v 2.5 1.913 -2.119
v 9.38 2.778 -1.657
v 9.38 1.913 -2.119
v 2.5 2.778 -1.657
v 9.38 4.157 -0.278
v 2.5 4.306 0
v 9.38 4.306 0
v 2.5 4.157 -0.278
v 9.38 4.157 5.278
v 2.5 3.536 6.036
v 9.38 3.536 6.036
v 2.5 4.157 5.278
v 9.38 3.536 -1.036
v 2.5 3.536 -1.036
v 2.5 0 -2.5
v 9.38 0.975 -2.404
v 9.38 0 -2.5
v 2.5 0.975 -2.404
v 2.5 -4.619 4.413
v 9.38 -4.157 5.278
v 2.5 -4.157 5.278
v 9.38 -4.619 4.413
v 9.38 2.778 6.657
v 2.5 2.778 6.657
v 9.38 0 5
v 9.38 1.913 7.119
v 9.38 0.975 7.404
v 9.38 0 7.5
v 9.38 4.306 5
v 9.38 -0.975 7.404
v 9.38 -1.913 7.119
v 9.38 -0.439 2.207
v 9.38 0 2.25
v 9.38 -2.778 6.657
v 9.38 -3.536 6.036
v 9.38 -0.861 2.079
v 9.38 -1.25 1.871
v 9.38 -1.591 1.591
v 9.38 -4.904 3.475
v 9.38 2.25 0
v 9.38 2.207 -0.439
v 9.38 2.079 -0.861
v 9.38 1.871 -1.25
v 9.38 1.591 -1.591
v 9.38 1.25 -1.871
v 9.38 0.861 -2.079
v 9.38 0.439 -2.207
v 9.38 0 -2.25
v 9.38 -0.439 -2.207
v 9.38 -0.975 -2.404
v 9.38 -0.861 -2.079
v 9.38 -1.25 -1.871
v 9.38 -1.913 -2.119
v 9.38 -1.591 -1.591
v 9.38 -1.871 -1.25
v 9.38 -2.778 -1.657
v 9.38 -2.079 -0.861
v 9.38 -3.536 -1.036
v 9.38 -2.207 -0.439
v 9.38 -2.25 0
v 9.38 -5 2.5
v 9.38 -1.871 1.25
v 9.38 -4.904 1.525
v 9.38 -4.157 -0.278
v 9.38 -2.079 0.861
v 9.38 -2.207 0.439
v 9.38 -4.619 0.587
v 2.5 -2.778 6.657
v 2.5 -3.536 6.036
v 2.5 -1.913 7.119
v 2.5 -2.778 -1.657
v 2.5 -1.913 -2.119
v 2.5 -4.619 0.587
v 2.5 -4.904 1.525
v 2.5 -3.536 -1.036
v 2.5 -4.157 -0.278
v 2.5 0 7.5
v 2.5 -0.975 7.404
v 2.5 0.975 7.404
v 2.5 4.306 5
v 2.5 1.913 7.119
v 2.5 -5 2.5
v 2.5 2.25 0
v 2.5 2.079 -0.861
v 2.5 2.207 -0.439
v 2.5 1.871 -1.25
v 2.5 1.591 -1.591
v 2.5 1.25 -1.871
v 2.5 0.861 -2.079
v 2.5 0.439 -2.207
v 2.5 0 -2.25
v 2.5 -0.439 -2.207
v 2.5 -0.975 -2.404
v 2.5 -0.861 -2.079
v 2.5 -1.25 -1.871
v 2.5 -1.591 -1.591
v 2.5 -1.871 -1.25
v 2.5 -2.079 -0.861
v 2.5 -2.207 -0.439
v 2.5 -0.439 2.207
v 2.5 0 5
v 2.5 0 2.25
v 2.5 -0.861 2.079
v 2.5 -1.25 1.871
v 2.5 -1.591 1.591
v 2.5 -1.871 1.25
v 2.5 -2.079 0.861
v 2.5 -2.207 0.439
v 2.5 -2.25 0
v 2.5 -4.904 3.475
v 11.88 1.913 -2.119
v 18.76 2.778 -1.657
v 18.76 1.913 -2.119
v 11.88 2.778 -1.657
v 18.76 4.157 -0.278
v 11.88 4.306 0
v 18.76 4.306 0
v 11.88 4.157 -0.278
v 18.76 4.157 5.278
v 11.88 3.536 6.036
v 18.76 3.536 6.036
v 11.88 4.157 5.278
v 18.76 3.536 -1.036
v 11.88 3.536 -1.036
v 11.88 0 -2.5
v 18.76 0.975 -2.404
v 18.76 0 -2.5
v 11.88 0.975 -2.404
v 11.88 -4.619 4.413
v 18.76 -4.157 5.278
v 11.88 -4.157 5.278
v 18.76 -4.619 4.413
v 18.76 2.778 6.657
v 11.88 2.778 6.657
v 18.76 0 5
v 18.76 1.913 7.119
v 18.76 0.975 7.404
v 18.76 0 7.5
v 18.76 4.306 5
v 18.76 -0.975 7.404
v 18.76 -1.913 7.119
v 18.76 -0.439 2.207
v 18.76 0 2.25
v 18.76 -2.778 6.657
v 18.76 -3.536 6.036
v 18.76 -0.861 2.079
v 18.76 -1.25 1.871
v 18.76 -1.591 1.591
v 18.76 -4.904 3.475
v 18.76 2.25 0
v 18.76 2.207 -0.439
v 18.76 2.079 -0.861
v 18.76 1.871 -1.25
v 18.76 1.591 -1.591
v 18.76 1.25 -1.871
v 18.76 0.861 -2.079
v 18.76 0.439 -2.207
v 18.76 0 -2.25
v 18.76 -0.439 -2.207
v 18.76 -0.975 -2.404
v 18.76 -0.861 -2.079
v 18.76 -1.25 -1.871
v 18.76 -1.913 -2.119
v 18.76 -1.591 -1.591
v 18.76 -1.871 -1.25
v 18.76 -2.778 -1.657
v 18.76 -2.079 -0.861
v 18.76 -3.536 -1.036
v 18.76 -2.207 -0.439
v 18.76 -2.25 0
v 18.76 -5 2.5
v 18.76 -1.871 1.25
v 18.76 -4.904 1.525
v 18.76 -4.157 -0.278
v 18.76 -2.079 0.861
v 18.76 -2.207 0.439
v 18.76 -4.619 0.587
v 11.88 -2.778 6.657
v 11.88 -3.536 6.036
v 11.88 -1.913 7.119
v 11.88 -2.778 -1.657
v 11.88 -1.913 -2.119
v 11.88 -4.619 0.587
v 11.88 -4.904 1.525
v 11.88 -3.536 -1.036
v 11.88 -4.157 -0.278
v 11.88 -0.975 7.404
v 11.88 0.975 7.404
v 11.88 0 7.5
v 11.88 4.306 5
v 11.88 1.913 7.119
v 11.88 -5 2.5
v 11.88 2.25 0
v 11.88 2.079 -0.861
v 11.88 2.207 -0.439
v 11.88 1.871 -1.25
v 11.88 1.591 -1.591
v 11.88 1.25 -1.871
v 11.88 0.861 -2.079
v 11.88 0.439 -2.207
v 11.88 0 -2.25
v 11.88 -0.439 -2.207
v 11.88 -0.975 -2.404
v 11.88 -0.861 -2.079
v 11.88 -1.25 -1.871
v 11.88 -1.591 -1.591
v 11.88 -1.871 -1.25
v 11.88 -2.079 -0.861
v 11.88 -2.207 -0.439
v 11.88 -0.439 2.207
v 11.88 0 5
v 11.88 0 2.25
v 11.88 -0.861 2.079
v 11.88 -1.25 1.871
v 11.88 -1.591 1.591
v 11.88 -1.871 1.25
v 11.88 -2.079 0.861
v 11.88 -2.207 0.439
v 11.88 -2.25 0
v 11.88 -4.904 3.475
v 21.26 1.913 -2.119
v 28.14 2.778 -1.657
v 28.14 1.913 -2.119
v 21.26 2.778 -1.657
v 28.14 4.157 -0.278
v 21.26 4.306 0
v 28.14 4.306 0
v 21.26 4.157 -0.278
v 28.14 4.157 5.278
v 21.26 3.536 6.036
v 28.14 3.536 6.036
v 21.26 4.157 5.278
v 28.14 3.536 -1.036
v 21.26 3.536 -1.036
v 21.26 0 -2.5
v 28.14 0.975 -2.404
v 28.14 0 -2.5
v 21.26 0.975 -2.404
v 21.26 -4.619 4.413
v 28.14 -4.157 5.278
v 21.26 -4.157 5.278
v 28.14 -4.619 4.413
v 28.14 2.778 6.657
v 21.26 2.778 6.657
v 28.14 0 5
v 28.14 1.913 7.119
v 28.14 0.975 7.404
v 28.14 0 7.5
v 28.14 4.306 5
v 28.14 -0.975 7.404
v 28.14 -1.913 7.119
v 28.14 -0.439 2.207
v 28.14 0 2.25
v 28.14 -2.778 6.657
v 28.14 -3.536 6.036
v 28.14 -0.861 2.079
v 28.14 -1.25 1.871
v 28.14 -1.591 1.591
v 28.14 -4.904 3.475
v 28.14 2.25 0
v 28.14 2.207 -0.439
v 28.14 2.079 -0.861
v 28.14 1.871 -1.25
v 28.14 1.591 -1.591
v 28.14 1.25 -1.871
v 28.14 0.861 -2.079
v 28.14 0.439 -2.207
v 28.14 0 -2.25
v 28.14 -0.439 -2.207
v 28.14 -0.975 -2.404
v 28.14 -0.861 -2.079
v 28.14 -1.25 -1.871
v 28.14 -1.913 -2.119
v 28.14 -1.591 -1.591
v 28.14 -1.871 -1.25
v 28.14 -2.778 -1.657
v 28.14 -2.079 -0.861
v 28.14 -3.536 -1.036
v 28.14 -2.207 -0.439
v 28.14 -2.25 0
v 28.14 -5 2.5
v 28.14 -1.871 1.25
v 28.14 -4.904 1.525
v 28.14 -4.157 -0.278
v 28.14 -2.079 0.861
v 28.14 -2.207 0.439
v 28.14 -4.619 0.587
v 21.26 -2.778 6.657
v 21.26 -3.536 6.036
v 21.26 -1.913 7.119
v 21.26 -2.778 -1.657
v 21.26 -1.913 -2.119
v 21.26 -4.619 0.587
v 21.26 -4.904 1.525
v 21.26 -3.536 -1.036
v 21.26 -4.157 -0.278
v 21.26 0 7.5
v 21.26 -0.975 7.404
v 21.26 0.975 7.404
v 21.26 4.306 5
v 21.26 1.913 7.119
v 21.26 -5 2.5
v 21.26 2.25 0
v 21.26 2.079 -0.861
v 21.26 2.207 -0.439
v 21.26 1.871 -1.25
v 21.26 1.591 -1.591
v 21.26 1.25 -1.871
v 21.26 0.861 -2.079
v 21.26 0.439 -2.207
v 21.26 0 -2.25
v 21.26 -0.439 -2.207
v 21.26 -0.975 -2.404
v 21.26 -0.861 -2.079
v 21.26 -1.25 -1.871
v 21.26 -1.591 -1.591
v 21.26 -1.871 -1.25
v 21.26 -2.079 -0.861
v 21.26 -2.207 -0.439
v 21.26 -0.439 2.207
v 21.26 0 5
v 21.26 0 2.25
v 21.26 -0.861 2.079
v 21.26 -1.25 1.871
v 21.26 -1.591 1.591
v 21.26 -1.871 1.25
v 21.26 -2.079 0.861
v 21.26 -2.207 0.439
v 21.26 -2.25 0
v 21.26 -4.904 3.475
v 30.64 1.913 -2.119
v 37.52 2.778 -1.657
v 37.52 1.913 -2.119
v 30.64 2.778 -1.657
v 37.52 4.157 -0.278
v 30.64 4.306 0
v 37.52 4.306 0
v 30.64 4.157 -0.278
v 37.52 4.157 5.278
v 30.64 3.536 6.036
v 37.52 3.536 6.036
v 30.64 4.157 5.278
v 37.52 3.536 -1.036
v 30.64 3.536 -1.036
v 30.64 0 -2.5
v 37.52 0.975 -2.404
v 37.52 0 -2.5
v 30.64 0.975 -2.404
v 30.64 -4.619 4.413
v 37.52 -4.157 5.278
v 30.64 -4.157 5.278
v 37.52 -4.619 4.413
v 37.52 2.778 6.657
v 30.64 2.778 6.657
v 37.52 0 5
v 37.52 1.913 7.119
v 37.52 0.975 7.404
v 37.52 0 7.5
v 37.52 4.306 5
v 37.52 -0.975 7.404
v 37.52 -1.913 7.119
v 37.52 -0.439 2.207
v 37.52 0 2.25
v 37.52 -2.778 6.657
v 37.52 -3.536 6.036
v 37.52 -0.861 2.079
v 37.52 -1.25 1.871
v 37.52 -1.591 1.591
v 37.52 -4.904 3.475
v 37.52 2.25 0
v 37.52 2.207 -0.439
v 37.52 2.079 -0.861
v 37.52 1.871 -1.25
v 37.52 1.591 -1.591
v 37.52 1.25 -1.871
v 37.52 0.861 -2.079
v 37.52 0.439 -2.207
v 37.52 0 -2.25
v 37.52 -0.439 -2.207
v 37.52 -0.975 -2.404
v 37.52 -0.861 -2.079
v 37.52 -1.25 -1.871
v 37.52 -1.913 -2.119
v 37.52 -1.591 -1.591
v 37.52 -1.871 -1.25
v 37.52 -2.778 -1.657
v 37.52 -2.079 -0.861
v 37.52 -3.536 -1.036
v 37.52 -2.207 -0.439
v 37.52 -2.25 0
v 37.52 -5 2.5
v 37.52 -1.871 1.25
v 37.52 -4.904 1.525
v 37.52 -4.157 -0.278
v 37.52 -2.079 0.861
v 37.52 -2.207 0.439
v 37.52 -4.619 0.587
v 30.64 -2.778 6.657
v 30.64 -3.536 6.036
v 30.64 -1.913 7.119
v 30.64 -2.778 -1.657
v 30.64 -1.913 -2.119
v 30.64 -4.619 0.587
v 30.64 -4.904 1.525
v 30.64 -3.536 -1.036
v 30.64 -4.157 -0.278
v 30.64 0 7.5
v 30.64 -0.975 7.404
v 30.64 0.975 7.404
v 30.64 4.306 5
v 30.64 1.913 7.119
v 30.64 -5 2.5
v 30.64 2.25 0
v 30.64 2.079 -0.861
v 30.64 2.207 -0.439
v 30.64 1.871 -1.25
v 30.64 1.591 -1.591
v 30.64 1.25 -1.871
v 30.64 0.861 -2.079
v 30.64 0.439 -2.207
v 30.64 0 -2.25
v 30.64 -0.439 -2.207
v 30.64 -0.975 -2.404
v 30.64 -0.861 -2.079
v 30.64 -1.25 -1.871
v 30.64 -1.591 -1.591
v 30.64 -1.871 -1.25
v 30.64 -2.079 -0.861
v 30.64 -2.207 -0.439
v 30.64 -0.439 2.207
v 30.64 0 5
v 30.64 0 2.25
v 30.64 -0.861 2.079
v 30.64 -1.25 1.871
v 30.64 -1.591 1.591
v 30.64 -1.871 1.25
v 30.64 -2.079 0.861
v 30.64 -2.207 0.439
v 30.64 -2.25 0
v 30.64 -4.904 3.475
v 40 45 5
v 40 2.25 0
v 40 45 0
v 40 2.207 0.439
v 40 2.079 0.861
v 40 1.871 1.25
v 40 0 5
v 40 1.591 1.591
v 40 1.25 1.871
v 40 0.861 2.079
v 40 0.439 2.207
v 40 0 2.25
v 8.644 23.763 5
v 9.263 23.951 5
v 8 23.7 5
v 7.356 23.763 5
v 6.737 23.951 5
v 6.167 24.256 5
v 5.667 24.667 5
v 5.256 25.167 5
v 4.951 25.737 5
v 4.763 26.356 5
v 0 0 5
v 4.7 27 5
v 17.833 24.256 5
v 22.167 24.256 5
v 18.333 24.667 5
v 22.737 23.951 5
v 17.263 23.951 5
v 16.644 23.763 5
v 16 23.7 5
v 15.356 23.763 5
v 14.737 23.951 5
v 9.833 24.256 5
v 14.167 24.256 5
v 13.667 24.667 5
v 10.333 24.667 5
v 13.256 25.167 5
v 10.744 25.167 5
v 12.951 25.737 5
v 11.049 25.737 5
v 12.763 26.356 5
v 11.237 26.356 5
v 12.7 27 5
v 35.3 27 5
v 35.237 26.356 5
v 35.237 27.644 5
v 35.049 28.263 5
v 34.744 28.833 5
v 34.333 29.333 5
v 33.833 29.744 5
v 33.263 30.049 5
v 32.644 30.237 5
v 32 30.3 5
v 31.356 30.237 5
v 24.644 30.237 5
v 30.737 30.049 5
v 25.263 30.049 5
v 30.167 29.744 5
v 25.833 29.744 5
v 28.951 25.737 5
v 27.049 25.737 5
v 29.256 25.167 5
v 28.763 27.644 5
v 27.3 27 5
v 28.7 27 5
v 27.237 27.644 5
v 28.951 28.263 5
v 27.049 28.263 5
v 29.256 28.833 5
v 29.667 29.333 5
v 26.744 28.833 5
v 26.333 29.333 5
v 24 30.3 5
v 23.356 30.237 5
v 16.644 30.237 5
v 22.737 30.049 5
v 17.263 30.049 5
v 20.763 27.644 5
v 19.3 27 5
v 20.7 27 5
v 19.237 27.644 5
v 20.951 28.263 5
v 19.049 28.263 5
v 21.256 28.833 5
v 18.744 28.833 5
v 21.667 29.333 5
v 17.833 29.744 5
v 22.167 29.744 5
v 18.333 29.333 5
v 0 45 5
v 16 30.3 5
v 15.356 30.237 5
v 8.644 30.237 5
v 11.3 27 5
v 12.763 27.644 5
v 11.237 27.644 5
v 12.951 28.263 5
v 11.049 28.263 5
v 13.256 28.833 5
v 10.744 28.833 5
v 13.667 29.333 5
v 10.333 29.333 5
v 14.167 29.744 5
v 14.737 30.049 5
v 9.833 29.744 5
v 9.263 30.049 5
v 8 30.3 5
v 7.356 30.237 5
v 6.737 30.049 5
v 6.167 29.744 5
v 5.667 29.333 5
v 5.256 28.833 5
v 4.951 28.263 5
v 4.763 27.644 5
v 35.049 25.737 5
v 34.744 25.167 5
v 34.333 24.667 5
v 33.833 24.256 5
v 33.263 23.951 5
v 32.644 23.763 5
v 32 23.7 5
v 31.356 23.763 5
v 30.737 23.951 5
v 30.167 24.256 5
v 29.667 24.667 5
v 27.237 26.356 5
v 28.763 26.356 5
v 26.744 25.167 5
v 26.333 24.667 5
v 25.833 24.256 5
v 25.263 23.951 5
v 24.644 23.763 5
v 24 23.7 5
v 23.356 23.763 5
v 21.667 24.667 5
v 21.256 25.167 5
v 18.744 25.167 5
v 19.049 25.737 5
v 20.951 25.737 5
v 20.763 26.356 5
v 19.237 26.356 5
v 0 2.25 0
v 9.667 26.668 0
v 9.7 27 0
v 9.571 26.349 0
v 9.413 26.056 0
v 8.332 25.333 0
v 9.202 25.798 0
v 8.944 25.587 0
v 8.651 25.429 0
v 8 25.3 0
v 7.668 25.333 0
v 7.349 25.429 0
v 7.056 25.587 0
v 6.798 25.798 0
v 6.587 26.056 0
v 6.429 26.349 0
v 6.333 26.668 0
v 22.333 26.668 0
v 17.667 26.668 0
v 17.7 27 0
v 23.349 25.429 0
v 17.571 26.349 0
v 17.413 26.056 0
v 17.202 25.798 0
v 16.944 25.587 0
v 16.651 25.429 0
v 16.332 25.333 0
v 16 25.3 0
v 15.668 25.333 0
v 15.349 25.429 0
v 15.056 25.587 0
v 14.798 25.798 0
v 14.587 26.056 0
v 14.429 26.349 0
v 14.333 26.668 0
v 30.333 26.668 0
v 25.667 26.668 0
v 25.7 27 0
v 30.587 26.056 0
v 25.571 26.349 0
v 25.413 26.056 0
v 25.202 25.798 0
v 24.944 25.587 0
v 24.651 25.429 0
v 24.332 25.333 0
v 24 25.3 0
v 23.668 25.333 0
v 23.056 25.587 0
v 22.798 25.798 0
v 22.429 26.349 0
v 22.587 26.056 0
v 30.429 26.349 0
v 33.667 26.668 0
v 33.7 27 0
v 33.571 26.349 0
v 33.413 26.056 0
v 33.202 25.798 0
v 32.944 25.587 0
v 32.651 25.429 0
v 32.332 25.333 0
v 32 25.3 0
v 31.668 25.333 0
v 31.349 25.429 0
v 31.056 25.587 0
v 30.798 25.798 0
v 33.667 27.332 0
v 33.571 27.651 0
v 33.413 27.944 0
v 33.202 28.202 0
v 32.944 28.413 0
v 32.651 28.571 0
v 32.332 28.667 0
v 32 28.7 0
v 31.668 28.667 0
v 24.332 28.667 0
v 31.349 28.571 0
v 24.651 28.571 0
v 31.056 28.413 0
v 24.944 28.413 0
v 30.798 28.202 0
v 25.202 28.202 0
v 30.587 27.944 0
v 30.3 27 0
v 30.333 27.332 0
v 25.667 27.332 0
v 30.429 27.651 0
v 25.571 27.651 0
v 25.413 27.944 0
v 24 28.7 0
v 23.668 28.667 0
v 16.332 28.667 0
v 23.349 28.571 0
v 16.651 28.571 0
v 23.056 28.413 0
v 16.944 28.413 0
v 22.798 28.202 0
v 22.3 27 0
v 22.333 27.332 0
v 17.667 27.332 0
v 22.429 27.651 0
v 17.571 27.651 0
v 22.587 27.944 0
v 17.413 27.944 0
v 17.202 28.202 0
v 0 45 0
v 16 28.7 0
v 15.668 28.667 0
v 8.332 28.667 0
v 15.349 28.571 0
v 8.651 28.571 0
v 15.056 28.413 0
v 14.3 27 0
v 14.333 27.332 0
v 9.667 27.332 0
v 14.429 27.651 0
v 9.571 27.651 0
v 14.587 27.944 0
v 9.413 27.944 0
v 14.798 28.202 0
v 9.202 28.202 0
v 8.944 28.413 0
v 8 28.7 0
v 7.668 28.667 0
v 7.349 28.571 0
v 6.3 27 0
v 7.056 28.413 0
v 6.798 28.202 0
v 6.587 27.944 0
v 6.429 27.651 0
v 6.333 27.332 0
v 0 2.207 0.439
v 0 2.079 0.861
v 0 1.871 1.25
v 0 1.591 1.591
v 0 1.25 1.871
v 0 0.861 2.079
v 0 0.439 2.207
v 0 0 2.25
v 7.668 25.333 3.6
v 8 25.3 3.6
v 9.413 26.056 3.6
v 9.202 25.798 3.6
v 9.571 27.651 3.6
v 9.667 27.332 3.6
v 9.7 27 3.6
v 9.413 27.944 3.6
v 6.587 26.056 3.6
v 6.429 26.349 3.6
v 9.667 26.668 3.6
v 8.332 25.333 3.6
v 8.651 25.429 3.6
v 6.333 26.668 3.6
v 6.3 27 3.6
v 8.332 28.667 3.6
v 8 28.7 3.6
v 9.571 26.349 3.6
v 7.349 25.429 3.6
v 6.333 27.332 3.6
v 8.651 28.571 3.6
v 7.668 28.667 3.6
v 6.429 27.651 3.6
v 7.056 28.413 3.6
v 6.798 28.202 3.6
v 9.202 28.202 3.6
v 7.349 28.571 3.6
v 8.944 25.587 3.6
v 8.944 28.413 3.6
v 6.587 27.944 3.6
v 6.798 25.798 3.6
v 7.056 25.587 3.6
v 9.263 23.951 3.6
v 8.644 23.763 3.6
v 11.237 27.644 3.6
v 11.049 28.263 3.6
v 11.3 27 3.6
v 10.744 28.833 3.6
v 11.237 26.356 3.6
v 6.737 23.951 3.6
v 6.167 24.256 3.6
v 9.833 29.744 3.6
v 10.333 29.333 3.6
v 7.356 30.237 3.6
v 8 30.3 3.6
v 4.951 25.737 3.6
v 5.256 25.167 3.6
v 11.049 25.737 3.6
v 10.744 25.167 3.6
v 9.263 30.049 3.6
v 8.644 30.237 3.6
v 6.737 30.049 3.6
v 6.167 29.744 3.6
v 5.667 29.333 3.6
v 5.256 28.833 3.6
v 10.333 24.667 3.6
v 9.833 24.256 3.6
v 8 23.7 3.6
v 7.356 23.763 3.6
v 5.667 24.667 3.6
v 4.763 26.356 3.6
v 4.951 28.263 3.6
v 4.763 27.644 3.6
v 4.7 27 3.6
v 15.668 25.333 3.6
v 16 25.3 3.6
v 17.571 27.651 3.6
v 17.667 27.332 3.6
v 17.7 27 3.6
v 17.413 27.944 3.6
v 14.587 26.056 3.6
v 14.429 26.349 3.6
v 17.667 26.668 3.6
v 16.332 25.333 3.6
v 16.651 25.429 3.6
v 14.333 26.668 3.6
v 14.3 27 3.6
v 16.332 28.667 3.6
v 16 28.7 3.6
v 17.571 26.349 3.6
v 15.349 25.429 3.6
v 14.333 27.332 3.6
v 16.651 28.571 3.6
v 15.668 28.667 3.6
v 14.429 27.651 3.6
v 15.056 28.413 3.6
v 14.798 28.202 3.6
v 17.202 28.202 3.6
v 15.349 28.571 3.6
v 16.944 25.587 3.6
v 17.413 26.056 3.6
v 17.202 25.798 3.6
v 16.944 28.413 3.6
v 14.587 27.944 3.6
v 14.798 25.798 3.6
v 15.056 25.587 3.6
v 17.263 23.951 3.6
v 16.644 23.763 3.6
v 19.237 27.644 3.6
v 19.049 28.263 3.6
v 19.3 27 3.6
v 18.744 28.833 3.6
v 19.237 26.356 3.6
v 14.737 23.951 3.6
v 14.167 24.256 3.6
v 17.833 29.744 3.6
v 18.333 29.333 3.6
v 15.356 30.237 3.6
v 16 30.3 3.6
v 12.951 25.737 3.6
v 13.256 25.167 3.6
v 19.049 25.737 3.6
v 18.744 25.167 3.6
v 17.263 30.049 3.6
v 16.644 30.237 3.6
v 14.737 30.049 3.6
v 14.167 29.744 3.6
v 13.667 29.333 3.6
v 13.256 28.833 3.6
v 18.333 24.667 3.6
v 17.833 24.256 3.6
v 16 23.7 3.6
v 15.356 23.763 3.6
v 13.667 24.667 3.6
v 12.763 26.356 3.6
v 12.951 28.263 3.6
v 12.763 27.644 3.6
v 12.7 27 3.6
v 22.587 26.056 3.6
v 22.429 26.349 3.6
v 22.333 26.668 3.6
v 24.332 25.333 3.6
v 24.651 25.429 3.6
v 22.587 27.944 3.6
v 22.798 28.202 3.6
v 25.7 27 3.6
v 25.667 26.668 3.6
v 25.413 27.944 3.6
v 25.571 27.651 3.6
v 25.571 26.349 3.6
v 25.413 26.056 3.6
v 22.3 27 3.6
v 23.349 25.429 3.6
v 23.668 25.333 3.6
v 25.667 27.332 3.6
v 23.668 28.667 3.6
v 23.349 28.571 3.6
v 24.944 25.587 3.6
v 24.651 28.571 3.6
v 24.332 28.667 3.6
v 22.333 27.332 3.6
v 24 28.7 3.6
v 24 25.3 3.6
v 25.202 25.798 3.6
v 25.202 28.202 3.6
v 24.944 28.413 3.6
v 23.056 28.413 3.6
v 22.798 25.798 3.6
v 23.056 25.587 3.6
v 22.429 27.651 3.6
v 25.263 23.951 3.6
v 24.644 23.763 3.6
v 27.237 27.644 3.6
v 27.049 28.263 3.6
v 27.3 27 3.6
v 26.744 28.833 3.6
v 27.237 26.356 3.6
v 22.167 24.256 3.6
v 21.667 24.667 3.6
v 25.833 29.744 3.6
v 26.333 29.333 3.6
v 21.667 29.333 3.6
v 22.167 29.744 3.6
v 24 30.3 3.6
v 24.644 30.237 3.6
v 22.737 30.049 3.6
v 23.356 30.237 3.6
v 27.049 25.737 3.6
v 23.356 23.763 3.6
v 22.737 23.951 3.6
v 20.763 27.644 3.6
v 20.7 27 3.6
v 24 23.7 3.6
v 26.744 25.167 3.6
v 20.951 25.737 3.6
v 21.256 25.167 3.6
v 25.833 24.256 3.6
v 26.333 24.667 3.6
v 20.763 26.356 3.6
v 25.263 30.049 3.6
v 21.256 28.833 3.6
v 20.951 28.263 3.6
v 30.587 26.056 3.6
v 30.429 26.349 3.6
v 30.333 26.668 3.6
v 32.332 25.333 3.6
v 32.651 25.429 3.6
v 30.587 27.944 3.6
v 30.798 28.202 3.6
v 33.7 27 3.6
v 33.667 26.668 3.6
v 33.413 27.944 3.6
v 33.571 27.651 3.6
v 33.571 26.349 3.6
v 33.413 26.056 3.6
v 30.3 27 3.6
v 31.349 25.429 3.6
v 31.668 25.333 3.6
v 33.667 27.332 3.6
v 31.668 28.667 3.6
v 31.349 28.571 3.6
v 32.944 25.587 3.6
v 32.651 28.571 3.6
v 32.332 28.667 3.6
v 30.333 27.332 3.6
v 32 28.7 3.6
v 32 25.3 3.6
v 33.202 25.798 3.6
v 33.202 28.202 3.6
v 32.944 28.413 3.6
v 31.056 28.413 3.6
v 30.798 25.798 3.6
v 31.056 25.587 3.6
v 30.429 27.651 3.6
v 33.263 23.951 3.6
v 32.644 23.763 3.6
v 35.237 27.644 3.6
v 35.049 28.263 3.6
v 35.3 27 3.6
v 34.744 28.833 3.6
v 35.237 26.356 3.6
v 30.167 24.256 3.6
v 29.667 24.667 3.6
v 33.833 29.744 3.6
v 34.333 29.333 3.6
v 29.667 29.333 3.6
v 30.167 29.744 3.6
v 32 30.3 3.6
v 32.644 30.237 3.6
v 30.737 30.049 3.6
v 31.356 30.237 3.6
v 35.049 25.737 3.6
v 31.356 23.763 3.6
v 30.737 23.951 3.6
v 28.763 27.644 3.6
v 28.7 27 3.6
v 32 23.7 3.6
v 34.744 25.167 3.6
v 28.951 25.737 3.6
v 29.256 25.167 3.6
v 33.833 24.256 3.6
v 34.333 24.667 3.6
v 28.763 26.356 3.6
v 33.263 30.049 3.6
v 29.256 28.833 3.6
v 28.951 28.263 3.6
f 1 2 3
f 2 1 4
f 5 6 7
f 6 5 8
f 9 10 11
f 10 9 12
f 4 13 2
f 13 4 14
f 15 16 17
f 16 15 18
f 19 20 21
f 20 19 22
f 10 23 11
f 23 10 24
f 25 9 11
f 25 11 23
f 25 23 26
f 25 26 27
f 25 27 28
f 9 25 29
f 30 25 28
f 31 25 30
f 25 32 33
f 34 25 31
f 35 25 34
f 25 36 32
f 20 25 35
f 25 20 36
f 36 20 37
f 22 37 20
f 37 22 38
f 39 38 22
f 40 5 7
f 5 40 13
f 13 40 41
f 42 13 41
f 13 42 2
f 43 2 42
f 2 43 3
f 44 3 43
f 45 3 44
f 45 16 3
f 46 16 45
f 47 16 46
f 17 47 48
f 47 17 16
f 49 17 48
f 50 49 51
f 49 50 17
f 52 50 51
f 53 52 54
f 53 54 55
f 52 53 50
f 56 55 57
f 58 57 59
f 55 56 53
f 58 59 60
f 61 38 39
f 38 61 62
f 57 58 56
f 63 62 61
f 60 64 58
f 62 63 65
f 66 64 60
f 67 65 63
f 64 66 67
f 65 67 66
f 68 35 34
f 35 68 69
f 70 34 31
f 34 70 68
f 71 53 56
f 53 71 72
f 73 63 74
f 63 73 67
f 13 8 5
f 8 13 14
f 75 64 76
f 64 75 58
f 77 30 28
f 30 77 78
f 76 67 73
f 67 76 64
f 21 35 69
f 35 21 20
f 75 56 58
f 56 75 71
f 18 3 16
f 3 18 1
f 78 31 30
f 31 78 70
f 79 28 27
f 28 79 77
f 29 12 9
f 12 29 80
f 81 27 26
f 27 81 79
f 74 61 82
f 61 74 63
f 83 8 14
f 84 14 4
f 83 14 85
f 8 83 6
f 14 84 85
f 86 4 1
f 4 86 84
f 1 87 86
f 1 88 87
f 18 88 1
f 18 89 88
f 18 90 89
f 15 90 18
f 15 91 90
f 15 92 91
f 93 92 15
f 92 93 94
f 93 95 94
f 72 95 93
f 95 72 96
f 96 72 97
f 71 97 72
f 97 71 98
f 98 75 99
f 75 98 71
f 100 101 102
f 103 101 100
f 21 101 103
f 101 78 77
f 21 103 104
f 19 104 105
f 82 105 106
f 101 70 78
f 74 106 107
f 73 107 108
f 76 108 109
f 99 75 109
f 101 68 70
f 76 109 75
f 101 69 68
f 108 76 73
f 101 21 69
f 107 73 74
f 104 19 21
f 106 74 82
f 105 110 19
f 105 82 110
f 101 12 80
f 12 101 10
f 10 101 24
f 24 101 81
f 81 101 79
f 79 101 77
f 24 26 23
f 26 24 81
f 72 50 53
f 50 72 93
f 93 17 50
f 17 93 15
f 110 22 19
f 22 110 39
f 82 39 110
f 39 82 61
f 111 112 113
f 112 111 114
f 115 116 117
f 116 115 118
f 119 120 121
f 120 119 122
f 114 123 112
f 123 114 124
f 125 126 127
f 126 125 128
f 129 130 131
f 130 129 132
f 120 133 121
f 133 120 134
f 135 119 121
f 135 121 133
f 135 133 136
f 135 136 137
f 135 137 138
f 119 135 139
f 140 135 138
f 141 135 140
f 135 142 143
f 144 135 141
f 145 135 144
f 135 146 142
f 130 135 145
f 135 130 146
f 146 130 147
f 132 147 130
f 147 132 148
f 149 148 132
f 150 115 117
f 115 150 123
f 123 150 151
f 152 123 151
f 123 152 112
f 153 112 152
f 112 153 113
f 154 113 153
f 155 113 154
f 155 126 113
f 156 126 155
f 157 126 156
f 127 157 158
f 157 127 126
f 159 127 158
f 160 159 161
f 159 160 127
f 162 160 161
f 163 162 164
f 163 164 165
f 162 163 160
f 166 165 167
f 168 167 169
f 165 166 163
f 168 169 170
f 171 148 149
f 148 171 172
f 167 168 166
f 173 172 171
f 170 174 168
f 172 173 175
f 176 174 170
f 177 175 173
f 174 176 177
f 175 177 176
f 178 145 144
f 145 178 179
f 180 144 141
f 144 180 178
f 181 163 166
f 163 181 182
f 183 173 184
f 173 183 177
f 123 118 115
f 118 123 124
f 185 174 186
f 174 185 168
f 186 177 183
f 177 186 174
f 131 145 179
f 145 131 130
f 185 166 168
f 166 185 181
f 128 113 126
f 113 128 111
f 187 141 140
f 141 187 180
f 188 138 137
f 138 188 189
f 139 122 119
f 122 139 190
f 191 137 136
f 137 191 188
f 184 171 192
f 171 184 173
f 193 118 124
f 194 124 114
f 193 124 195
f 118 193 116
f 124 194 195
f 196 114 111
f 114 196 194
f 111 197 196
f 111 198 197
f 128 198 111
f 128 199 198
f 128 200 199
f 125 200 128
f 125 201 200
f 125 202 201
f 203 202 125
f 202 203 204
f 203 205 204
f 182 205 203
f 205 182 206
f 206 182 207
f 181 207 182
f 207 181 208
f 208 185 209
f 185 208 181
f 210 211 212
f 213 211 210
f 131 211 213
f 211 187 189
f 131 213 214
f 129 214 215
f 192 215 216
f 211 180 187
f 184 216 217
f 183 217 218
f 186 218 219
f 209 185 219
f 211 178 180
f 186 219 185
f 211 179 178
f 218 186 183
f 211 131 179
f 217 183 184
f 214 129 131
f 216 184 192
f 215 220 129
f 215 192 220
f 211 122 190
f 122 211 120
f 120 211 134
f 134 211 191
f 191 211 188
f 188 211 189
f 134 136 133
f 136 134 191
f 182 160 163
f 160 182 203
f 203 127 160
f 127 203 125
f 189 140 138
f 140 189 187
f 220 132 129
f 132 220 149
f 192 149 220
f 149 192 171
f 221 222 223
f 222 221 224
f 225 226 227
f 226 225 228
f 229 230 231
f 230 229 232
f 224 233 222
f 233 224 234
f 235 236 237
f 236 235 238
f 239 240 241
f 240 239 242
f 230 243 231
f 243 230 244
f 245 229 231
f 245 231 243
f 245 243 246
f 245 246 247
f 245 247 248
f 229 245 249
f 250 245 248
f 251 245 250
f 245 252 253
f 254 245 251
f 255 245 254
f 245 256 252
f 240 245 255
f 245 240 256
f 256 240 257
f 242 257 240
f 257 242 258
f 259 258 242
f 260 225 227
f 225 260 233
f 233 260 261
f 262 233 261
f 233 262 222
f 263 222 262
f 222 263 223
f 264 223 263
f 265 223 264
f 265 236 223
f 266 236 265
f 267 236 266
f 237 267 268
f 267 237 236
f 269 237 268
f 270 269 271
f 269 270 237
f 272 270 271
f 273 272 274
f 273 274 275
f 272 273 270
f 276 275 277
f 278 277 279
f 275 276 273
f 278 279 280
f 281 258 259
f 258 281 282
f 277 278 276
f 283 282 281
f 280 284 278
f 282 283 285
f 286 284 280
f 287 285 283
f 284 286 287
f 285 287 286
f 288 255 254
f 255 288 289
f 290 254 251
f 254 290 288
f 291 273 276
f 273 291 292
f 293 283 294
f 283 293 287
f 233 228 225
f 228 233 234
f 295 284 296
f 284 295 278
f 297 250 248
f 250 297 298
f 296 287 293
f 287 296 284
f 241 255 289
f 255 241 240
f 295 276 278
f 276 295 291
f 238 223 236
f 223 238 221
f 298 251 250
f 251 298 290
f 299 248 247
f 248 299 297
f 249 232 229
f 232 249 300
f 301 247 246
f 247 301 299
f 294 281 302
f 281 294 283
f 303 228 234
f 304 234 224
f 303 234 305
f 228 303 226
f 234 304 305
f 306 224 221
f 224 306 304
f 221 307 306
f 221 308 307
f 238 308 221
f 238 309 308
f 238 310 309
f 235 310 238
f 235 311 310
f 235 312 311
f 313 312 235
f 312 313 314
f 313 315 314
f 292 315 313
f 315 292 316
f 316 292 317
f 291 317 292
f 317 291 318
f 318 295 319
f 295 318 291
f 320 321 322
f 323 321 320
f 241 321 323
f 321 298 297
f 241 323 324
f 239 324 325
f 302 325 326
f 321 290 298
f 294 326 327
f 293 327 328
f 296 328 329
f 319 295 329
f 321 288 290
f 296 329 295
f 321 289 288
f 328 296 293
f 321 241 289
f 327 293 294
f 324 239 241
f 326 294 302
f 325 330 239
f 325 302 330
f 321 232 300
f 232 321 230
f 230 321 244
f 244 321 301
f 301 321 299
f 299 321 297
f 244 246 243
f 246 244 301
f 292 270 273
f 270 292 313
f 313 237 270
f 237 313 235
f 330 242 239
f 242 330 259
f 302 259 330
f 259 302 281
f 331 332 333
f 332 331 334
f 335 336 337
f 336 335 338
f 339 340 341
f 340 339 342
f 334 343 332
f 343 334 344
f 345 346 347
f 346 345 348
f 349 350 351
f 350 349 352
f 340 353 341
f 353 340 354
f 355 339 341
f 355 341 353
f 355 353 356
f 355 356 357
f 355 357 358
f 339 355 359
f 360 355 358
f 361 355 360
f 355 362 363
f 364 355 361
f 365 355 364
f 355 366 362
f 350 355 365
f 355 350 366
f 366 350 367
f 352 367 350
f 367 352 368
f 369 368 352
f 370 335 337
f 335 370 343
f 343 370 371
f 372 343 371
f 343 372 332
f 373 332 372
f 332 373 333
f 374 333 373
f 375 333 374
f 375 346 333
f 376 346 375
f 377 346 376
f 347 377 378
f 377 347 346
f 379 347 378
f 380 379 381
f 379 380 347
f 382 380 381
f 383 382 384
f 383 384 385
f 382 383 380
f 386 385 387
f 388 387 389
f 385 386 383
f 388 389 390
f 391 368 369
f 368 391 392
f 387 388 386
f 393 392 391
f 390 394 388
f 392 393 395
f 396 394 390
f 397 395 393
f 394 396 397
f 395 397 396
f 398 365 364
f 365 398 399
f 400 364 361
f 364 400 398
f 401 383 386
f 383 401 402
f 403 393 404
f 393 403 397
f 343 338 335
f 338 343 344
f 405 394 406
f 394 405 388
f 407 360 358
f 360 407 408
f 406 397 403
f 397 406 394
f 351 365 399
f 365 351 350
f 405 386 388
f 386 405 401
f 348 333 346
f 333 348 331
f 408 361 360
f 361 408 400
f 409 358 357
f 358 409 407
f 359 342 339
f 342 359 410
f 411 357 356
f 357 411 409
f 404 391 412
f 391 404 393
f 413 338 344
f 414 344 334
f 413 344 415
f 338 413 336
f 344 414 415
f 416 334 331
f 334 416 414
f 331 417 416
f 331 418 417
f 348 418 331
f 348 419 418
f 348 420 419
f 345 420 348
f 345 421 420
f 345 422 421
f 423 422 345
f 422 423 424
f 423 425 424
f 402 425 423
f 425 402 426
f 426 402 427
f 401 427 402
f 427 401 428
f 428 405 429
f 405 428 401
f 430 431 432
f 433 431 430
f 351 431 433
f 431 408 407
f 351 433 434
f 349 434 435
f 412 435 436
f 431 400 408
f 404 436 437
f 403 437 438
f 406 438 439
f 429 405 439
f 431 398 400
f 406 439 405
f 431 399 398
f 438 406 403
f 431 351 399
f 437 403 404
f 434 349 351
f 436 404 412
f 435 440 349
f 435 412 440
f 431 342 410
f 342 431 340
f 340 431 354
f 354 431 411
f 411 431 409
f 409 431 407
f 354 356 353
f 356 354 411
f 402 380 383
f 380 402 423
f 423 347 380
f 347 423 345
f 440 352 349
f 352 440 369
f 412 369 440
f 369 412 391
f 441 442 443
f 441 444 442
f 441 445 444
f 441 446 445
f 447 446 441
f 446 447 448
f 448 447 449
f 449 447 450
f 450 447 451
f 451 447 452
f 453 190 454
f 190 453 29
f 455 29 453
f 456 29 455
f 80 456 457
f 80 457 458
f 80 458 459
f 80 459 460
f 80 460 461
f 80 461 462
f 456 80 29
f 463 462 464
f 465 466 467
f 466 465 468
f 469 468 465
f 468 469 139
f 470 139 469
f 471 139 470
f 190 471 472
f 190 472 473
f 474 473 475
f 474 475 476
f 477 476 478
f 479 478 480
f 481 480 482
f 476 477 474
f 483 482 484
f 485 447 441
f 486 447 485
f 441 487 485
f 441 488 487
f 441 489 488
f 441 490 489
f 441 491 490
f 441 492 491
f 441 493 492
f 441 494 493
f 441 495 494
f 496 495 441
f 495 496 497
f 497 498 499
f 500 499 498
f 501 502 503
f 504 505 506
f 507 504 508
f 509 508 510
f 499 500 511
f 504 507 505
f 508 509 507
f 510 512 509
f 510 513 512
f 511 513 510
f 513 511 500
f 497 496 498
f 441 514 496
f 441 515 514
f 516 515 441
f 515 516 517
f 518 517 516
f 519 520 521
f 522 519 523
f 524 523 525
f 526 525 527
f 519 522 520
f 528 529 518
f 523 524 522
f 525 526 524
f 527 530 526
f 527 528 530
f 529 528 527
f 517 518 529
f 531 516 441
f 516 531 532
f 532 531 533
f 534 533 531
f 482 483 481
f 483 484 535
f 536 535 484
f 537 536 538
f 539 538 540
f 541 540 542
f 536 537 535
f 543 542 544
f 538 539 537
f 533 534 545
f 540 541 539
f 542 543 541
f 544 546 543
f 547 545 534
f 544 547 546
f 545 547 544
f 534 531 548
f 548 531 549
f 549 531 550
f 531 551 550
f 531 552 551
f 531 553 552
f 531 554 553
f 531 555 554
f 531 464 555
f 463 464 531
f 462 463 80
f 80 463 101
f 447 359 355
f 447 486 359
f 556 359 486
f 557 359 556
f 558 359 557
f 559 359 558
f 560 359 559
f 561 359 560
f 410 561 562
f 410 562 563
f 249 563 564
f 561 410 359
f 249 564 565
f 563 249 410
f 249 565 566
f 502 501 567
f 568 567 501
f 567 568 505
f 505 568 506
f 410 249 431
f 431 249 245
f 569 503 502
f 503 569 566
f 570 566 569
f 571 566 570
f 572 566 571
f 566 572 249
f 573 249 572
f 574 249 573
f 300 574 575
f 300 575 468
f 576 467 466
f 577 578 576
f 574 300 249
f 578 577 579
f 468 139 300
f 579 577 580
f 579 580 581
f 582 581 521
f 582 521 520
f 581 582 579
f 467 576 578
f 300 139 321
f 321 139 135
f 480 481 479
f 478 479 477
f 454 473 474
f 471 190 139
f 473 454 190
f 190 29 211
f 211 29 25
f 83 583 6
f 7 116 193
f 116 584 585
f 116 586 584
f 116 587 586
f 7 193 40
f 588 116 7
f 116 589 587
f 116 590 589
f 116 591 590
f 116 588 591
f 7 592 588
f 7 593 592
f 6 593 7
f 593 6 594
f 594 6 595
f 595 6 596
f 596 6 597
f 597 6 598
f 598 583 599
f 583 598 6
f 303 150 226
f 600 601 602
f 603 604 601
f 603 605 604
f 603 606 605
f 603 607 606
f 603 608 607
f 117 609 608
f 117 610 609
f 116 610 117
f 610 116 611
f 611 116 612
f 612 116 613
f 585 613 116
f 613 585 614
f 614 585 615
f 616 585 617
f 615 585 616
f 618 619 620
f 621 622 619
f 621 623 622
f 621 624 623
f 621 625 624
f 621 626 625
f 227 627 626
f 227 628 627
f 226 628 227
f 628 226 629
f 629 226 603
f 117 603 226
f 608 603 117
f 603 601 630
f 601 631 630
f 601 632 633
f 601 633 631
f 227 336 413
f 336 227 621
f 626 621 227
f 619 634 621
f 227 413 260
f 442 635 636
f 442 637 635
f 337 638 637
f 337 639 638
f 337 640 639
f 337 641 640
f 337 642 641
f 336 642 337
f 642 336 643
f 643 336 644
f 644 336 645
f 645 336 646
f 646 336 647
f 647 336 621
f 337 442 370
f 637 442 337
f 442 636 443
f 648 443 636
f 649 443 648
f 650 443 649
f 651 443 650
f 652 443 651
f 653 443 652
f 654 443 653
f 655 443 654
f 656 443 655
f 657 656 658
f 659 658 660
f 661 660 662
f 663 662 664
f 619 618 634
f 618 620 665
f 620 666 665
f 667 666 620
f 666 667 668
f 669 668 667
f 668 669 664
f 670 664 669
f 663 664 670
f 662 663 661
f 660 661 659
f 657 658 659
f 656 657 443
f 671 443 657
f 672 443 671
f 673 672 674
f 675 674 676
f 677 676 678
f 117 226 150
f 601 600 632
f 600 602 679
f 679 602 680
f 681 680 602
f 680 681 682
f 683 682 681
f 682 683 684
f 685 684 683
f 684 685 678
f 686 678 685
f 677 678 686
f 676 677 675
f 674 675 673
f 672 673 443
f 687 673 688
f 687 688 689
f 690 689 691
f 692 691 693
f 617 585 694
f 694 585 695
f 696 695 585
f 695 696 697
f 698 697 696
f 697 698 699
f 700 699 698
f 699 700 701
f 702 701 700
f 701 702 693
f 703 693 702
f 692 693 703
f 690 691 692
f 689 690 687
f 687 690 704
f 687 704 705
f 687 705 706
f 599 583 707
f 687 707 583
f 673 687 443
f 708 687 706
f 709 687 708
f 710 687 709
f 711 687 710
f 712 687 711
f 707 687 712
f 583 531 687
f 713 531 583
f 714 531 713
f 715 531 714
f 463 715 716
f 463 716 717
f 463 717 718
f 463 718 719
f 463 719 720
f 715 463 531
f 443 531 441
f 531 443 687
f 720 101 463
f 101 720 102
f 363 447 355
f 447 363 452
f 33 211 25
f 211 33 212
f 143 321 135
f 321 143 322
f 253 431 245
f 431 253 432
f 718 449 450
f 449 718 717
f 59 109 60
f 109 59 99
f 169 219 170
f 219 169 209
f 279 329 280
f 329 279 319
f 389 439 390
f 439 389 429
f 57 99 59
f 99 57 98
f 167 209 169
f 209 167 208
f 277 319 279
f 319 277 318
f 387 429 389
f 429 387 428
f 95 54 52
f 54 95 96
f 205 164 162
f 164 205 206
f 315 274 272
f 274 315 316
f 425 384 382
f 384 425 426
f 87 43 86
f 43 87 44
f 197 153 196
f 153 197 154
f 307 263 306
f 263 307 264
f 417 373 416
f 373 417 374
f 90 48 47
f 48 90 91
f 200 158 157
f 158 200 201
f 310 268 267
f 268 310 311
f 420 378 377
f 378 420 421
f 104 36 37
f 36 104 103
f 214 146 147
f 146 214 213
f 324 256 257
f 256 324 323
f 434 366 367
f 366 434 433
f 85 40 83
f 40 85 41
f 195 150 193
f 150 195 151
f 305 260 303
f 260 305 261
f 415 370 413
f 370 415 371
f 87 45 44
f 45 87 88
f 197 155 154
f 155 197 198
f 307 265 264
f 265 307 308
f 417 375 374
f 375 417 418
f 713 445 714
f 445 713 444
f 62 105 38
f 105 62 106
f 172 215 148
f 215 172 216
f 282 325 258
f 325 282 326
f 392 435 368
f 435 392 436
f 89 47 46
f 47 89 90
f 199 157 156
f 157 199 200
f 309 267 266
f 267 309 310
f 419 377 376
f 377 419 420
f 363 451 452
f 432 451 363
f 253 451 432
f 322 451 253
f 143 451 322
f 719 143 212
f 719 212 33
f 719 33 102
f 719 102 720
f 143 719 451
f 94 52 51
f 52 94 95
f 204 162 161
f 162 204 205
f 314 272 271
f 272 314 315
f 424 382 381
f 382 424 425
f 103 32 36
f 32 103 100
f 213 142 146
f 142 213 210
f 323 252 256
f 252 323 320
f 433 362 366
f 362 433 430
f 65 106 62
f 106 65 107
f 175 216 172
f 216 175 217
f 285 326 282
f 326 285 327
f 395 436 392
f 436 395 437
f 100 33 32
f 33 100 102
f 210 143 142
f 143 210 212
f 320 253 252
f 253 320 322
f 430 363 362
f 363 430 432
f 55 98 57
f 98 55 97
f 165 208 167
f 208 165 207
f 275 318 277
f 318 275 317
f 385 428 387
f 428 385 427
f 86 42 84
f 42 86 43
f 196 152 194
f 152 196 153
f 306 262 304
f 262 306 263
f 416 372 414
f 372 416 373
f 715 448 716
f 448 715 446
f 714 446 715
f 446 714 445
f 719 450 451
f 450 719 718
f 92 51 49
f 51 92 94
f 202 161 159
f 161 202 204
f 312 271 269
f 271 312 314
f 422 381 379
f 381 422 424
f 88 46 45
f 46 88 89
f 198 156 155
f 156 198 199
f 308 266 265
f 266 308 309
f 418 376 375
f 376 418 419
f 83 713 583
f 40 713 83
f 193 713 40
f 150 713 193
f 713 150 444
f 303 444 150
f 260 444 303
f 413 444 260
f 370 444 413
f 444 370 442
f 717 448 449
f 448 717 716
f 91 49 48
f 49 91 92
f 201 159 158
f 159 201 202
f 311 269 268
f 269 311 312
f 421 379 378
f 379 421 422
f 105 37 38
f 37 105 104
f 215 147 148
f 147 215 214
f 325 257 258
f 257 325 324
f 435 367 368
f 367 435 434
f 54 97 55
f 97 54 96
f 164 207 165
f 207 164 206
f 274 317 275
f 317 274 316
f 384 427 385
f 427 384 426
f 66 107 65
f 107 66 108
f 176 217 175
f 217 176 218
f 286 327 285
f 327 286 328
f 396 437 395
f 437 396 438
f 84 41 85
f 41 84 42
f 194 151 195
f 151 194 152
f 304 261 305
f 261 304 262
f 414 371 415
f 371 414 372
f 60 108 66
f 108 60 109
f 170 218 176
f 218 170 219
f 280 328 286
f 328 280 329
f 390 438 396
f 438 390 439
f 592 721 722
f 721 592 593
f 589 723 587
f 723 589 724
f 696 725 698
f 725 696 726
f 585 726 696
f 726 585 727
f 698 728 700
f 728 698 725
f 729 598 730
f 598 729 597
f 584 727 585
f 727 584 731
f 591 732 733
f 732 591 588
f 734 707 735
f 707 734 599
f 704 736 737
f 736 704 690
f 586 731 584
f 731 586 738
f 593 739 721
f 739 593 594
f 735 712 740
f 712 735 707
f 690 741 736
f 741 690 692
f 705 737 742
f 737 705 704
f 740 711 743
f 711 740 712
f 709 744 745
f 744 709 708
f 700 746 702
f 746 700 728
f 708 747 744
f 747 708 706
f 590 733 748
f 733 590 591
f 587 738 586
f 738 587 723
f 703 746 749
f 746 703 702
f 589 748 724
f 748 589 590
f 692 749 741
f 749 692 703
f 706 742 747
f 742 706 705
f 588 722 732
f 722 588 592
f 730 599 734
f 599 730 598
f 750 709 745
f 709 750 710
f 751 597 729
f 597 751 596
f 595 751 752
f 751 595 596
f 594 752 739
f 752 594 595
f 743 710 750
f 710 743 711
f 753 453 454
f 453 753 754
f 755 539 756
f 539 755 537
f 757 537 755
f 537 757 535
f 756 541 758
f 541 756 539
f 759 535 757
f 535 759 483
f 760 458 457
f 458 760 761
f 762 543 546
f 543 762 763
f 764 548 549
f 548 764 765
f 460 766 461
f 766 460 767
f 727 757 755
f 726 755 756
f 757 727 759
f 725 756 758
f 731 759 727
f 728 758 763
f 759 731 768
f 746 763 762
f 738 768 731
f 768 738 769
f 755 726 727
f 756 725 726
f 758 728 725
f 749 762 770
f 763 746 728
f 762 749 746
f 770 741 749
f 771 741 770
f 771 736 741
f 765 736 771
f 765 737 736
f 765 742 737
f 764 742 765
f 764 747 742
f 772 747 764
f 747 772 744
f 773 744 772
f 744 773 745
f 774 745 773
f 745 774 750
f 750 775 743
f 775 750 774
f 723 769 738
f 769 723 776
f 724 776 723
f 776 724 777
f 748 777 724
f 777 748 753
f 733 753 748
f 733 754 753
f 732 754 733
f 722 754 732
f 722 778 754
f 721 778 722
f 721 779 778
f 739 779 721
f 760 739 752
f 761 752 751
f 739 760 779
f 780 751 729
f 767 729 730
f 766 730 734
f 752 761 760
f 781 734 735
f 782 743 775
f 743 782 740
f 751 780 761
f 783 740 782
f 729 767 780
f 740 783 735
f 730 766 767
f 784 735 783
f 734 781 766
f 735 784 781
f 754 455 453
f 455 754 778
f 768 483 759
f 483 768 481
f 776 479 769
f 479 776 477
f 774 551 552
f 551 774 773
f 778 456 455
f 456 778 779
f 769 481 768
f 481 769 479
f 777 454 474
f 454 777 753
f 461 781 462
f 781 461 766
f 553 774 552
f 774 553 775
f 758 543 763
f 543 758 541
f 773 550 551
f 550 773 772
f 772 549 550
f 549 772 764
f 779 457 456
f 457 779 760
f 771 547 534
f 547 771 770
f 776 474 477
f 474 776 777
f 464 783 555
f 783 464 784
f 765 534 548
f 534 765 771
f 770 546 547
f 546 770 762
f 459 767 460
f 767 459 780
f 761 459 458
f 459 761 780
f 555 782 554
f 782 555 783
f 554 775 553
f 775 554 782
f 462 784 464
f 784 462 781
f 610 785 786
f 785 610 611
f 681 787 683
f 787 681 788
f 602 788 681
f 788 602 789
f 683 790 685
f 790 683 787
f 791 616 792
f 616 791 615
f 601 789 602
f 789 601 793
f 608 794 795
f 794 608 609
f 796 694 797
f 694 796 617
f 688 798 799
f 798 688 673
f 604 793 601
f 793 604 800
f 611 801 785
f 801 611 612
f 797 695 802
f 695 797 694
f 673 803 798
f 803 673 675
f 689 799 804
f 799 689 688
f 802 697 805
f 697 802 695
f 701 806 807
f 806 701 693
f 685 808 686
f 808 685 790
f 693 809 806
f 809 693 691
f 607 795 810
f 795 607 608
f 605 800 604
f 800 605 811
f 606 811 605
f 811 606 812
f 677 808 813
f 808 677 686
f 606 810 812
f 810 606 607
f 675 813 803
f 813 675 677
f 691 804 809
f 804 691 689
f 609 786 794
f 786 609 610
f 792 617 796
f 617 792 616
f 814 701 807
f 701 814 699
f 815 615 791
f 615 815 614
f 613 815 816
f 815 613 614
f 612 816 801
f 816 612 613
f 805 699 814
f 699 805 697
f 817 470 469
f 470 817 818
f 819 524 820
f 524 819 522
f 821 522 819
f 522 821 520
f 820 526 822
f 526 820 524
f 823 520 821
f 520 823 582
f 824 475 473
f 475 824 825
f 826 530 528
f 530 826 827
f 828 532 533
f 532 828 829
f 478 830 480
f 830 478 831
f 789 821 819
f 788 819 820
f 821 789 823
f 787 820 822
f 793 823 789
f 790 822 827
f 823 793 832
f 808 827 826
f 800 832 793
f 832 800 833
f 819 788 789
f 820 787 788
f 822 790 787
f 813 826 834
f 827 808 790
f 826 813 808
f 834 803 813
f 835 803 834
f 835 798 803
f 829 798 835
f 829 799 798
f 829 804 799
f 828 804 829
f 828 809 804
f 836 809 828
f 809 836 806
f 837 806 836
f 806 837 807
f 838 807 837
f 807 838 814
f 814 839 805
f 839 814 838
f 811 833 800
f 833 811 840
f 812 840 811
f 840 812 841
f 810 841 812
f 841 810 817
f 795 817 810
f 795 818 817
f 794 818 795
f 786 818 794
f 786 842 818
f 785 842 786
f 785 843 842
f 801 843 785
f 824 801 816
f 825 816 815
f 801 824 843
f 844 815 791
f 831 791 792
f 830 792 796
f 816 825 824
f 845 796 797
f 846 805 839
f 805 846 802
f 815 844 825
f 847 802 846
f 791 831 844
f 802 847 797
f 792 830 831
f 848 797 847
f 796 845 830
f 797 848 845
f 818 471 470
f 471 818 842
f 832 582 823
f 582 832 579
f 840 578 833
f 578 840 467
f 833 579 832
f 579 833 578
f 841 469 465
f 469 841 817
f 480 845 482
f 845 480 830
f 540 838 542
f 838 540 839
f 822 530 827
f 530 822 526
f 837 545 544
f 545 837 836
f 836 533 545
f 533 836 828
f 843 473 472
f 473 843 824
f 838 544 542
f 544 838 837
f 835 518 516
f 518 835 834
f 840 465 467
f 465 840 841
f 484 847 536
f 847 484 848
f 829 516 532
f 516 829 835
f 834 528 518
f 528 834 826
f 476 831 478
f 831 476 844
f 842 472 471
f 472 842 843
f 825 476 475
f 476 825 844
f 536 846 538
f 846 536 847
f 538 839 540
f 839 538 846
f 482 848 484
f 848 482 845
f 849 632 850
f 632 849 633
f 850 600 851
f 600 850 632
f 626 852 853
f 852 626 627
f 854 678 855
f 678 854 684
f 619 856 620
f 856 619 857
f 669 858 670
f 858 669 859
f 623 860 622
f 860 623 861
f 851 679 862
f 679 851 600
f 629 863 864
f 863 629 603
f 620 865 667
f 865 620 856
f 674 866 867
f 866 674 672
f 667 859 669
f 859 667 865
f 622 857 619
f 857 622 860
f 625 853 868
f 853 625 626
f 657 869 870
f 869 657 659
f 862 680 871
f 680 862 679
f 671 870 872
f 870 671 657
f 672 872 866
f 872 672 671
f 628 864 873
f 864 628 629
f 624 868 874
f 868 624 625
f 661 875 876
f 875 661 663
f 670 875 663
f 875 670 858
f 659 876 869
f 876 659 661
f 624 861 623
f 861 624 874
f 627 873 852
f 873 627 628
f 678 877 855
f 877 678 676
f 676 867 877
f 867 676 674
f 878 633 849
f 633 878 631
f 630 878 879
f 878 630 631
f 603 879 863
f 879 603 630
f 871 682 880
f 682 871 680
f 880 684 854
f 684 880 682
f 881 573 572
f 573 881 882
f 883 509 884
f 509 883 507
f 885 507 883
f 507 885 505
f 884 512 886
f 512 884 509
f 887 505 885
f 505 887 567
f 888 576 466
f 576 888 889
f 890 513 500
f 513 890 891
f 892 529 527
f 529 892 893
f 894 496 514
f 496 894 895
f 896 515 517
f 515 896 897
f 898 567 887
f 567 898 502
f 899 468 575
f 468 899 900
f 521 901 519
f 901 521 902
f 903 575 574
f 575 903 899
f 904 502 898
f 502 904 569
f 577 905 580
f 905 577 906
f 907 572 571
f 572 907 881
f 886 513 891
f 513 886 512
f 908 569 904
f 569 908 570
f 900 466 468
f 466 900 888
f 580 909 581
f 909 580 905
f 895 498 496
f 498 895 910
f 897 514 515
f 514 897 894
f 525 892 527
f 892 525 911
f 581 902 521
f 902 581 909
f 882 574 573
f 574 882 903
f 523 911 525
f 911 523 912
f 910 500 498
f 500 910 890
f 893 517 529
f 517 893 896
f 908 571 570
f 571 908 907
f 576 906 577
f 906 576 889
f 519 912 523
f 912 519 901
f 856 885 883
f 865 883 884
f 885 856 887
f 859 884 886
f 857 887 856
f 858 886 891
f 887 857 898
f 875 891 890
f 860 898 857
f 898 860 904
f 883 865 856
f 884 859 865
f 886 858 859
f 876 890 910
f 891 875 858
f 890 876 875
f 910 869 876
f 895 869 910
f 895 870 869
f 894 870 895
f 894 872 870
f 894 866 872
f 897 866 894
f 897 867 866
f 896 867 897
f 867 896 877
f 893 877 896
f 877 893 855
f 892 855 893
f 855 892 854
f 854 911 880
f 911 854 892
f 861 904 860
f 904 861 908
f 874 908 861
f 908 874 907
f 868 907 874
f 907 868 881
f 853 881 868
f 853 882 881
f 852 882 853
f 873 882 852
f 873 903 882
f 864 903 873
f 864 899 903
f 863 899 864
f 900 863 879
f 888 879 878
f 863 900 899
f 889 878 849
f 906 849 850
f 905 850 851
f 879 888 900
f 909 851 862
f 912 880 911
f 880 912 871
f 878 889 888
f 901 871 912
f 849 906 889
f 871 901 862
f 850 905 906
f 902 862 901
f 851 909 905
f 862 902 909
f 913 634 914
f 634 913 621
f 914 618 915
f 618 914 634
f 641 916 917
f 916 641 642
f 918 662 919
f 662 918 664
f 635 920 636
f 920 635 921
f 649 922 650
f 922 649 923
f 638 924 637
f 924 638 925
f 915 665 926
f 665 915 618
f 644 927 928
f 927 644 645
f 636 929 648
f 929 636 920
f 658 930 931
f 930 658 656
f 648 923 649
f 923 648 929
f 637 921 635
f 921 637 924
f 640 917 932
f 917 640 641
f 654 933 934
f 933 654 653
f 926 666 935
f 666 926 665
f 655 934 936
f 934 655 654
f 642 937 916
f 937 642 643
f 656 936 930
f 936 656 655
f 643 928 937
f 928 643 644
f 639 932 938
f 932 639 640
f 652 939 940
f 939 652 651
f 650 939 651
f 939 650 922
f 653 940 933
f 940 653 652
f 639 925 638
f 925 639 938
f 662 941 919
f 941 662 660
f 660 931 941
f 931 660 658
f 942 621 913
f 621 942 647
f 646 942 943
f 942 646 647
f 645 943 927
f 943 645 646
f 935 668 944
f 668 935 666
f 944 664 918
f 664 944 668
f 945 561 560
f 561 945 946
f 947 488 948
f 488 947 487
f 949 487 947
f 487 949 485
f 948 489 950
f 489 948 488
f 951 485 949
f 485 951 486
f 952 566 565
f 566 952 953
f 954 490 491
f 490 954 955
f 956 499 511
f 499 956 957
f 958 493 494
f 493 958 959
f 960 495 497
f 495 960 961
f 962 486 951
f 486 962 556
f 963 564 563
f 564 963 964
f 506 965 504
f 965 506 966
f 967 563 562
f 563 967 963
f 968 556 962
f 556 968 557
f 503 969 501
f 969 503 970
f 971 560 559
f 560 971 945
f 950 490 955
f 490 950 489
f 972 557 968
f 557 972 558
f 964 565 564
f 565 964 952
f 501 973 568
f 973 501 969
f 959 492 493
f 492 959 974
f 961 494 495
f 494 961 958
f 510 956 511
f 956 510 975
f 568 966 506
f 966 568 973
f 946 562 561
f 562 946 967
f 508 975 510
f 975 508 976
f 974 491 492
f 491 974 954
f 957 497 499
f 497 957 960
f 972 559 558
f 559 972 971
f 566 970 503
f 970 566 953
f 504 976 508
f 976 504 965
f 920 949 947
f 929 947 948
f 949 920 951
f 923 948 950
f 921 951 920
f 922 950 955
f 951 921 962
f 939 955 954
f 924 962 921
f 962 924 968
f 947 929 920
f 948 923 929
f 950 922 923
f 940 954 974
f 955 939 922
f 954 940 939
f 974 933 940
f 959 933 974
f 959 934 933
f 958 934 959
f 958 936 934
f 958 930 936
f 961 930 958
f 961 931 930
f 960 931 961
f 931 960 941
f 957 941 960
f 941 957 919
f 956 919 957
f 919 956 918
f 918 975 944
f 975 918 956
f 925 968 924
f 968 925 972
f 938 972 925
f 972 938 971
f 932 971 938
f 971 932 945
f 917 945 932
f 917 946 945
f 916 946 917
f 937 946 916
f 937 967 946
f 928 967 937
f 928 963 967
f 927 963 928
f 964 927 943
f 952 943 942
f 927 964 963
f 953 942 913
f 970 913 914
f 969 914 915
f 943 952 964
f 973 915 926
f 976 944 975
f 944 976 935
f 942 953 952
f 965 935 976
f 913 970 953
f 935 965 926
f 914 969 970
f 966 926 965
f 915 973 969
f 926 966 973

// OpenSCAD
$fn = 32;

// ----------------------------------------------------------------------
// Hinge leaf: 40 x 50 x 10 mm
// ----------------------------------------------------------------------

// --- parameters (mm) ---
tab_len = 40;             // leaf length, X
tab_w = 45;               // leaf width, Y
tab_t = 5;                // leaf thickness
ring_d = 10;              // knuckle diameter
ring_w = 6.88;            // knuckle width
knuckle_n = 4;            // number of knuckles
pin_d = 4.5;              // pin bore
gap = 2.5;                // gap between the knuckles
screw_d = 3.4;            // screw clearance
cs_d = 6.6;               // countersink diameter
cs_h = 1.4;               // countersink depth

module leaf() {
  cube([tab_len, tab_w, tab_t]);
}

module knuckles() {
  /* barrels sit on the leaf edge, the pin axis at half the leaf thickness */
  for (i = [0 : knuckle_n - 1])
    translate([gap + i * (ring_w + gap), 0, tab_t * 0.5])
      rotate([0, 90, 0]) cylinder(h = ring_w, d = ring_d);
}

difference() {
  union() {
    leaf();
    knuckles();
  }
  rotate([0, 90, 0]) translate([0, 0, -1])
    cylinder(h = tab_len + 2, d = pin_d);
  translate([8, tab_w * 0.6, -1]) cylinder(h = tab_t + 2, d = screw_d);
  translate([8, tab_w * 0.6, tab_t - cs_h]) cylinder(h = cs_h + 0.5, d = cs_d);
  translate([16, tab_w * 0.6, -1]) cylinder(h = tab_t + 2, d = screw_d);
  translate([16, tab_w * 0.6, tab_t - cs_h]) cylinder(h = cs_h + 0.5, d = cs_d);
  translate([24, tab_w * 0.6, -1]) cylinder(h = tab_t + 2, d = screw_d);
  translate([24, tab_w * 0.6, tab_t - cs_h]) cylinder(h = cs_h + 0.5, d = cs_d);
  translate([32, tab_w * 0.6, -1]) cylinder(h = tab_t + 2, d = screw_d);
  translate([32, tab_w * 0.6, tab_t - cs_h]) cylinder(h = cs_h + 0.5, d = cs_d);
}
